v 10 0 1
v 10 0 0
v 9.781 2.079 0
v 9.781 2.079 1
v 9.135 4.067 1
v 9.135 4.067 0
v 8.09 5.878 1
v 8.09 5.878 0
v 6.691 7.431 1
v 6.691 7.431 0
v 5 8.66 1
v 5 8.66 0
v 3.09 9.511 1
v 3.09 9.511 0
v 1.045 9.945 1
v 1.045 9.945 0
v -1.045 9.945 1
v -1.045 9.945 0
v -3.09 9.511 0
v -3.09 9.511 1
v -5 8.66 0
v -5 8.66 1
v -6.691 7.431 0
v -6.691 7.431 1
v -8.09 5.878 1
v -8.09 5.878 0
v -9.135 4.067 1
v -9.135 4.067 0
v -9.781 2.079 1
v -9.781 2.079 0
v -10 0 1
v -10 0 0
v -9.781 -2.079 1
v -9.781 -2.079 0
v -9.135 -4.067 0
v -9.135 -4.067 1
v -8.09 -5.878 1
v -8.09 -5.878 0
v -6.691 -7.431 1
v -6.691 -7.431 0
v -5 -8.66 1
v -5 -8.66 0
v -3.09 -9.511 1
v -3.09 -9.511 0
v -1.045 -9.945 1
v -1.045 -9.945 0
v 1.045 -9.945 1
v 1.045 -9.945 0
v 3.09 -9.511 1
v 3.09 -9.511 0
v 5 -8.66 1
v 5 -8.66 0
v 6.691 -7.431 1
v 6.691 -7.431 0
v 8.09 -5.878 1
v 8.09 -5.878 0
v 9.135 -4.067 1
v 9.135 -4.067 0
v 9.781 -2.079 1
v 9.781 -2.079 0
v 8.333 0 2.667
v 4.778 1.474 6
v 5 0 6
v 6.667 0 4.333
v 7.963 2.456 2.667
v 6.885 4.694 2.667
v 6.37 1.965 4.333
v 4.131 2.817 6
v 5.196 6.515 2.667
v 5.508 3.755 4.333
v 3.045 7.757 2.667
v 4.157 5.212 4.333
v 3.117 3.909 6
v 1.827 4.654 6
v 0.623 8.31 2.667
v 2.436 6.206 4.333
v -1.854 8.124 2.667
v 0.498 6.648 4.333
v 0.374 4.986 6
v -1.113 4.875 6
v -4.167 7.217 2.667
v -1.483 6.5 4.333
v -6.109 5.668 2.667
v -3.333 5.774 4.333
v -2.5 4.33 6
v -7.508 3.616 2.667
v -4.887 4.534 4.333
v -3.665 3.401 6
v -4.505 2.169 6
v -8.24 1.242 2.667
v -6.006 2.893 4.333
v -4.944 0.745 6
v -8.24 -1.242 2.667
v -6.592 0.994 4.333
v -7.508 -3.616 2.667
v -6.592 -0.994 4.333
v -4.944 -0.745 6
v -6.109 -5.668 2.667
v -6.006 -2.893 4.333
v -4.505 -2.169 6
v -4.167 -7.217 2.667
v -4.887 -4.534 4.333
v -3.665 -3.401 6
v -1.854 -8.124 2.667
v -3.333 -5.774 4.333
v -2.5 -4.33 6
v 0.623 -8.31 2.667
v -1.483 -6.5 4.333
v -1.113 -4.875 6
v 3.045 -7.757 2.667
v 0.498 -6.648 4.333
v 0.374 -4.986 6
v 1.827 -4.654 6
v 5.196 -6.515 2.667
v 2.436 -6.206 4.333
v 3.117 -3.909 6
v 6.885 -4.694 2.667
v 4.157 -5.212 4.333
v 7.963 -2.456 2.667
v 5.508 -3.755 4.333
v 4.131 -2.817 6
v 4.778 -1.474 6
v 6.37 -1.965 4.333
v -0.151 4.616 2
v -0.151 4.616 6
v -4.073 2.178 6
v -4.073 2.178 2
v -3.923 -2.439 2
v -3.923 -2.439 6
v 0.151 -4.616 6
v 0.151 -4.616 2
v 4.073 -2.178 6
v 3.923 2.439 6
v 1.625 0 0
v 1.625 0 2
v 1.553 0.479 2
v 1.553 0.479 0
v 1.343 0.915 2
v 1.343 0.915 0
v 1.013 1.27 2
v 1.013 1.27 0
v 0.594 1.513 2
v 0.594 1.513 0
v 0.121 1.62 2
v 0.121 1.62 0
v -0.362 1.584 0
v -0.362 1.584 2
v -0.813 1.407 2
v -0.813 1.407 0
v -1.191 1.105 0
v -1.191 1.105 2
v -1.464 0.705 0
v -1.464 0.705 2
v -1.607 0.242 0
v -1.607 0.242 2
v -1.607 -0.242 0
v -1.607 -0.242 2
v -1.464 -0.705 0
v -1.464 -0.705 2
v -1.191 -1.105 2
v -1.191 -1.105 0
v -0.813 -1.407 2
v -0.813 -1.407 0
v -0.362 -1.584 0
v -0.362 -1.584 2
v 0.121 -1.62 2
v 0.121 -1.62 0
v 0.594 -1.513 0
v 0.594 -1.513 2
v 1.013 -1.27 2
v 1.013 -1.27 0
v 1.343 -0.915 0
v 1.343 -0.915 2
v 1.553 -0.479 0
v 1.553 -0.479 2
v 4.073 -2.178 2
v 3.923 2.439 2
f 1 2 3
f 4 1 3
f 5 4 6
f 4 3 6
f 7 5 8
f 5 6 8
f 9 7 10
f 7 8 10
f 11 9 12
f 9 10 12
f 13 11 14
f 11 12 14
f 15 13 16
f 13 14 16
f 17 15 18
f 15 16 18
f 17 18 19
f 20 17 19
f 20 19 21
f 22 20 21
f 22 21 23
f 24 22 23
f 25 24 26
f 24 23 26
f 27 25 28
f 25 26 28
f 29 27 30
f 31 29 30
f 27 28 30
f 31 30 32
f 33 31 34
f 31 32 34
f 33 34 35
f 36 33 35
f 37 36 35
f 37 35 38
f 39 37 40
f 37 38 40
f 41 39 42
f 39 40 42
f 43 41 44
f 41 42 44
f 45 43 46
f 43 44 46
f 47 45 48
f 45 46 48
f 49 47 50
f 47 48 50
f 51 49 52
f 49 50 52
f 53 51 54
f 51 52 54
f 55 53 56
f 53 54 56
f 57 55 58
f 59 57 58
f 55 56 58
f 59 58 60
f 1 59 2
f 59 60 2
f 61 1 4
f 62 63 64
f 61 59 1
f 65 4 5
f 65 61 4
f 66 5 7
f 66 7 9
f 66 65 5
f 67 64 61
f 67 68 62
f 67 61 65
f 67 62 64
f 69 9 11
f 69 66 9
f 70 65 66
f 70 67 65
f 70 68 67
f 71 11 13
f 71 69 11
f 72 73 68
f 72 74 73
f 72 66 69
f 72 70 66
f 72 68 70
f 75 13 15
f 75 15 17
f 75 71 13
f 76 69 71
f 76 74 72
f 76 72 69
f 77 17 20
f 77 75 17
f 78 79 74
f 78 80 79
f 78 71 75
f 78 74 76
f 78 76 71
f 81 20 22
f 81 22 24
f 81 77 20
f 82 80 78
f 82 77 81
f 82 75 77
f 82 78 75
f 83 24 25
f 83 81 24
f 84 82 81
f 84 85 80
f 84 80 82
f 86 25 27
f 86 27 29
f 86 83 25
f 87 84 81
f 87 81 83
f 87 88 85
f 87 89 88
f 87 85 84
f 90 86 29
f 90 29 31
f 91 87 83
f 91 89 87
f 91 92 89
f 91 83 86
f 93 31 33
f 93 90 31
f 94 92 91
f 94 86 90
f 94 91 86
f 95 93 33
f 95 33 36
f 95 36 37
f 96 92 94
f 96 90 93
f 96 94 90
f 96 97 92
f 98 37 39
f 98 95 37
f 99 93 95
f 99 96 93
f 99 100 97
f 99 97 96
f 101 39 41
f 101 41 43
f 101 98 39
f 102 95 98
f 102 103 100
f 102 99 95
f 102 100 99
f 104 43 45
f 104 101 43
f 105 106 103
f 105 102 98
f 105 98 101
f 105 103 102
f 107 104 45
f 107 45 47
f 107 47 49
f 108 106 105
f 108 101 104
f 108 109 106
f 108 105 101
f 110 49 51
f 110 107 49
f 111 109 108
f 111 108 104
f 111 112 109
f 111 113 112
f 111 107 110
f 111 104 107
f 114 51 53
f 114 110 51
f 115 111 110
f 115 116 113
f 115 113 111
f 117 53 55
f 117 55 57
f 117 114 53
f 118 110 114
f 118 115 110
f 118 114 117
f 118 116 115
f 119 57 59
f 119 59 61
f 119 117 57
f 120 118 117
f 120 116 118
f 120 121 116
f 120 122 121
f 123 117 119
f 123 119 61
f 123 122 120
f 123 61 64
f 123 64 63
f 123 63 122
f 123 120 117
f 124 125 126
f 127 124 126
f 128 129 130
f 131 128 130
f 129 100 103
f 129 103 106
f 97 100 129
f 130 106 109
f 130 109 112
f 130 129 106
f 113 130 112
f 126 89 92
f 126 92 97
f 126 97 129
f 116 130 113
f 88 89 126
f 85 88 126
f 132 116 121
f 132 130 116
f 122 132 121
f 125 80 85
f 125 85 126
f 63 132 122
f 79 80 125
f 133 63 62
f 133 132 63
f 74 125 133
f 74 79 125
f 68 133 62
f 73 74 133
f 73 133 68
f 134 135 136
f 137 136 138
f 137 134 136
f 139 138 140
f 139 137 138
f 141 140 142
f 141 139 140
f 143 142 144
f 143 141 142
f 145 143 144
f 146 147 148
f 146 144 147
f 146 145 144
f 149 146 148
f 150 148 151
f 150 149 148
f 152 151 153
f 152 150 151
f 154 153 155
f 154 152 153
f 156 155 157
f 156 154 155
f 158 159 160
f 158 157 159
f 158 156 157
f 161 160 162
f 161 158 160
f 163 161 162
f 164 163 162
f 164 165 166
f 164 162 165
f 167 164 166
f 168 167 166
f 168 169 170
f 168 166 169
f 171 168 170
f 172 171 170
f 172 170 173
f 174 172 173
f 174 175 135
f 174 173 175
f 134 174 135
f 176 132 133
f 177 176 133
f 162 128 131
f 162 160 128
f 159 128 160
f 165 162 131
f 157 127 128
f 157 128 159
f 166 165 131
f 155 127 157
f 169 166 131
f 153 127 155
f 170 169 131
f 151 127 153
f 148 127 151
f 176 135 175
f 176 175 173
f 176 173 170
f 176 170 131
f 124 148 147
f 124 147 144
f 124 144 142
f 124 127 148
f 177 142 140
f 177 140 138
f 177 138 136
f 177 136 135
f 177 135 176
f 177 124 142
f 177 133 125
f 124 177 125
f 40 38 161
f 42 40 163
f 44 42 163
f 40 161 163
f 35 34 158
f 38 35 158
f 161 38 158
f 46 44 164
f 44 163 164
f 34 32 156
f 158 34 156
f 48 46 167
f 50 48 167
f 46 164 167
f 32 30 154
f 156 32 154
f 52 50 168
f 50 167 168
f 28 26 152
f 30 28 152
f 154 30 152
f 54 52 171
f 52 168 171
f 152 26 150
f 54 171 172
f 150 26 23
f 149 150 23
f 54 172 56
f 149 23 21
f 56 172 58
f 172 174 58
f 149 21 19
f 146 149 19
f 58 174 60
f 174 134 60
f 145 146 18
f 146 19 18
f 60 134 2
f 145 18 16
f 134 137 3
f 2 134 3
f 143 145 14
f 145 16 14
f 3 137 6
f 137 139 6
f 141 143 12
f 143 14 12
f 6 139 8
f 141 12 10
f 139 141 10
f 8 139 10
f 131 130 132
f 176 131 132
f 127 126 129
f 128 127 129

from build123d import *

# Parameters (mm, degrees)
F0_R     = 10
F1_DEPTH = 6
F2_SIZE  = 5
F4_DEPTH = 4
F5_R     = 1.625
F6_DEPTH = 5


with BuildPart() as f1:
    # F0 (on Top) → F1 (new body)
    with BuildSketch(Plane.XY):
        Circle(F0_R)
    extrude(amount=F1_DEPTH)

    # F2
    f2_edges = [f1.edges().sort_by_distance(p)[0] for p in [
        (-10, 0, 6),
    ]]
    chamfer(f2_edges, length=F2_SIZE)

    # F3 (on face) → F4 (cut)
    with BuildSketch(Plane.XY.offset(6)):
        Polygon((0.150565, -4.616347), (4.073156, -2.177781), (3.922592, 2.438566), (-0.150565, 4.616347), (-4.073156, 2.177781), (-3.922592, -2.438566), align=None)
    extrude(amount=-F4_DEPTH, mode=Mode.SUBTRACT)

    # F5 (on Top) → F6 (cut)
    with BuildSketch(Plane.XY):
        Circle(F5_R)
    extrude(amount=F6_DEPTH, mode=Mode.SUBTRACT)


solid = f1.part
